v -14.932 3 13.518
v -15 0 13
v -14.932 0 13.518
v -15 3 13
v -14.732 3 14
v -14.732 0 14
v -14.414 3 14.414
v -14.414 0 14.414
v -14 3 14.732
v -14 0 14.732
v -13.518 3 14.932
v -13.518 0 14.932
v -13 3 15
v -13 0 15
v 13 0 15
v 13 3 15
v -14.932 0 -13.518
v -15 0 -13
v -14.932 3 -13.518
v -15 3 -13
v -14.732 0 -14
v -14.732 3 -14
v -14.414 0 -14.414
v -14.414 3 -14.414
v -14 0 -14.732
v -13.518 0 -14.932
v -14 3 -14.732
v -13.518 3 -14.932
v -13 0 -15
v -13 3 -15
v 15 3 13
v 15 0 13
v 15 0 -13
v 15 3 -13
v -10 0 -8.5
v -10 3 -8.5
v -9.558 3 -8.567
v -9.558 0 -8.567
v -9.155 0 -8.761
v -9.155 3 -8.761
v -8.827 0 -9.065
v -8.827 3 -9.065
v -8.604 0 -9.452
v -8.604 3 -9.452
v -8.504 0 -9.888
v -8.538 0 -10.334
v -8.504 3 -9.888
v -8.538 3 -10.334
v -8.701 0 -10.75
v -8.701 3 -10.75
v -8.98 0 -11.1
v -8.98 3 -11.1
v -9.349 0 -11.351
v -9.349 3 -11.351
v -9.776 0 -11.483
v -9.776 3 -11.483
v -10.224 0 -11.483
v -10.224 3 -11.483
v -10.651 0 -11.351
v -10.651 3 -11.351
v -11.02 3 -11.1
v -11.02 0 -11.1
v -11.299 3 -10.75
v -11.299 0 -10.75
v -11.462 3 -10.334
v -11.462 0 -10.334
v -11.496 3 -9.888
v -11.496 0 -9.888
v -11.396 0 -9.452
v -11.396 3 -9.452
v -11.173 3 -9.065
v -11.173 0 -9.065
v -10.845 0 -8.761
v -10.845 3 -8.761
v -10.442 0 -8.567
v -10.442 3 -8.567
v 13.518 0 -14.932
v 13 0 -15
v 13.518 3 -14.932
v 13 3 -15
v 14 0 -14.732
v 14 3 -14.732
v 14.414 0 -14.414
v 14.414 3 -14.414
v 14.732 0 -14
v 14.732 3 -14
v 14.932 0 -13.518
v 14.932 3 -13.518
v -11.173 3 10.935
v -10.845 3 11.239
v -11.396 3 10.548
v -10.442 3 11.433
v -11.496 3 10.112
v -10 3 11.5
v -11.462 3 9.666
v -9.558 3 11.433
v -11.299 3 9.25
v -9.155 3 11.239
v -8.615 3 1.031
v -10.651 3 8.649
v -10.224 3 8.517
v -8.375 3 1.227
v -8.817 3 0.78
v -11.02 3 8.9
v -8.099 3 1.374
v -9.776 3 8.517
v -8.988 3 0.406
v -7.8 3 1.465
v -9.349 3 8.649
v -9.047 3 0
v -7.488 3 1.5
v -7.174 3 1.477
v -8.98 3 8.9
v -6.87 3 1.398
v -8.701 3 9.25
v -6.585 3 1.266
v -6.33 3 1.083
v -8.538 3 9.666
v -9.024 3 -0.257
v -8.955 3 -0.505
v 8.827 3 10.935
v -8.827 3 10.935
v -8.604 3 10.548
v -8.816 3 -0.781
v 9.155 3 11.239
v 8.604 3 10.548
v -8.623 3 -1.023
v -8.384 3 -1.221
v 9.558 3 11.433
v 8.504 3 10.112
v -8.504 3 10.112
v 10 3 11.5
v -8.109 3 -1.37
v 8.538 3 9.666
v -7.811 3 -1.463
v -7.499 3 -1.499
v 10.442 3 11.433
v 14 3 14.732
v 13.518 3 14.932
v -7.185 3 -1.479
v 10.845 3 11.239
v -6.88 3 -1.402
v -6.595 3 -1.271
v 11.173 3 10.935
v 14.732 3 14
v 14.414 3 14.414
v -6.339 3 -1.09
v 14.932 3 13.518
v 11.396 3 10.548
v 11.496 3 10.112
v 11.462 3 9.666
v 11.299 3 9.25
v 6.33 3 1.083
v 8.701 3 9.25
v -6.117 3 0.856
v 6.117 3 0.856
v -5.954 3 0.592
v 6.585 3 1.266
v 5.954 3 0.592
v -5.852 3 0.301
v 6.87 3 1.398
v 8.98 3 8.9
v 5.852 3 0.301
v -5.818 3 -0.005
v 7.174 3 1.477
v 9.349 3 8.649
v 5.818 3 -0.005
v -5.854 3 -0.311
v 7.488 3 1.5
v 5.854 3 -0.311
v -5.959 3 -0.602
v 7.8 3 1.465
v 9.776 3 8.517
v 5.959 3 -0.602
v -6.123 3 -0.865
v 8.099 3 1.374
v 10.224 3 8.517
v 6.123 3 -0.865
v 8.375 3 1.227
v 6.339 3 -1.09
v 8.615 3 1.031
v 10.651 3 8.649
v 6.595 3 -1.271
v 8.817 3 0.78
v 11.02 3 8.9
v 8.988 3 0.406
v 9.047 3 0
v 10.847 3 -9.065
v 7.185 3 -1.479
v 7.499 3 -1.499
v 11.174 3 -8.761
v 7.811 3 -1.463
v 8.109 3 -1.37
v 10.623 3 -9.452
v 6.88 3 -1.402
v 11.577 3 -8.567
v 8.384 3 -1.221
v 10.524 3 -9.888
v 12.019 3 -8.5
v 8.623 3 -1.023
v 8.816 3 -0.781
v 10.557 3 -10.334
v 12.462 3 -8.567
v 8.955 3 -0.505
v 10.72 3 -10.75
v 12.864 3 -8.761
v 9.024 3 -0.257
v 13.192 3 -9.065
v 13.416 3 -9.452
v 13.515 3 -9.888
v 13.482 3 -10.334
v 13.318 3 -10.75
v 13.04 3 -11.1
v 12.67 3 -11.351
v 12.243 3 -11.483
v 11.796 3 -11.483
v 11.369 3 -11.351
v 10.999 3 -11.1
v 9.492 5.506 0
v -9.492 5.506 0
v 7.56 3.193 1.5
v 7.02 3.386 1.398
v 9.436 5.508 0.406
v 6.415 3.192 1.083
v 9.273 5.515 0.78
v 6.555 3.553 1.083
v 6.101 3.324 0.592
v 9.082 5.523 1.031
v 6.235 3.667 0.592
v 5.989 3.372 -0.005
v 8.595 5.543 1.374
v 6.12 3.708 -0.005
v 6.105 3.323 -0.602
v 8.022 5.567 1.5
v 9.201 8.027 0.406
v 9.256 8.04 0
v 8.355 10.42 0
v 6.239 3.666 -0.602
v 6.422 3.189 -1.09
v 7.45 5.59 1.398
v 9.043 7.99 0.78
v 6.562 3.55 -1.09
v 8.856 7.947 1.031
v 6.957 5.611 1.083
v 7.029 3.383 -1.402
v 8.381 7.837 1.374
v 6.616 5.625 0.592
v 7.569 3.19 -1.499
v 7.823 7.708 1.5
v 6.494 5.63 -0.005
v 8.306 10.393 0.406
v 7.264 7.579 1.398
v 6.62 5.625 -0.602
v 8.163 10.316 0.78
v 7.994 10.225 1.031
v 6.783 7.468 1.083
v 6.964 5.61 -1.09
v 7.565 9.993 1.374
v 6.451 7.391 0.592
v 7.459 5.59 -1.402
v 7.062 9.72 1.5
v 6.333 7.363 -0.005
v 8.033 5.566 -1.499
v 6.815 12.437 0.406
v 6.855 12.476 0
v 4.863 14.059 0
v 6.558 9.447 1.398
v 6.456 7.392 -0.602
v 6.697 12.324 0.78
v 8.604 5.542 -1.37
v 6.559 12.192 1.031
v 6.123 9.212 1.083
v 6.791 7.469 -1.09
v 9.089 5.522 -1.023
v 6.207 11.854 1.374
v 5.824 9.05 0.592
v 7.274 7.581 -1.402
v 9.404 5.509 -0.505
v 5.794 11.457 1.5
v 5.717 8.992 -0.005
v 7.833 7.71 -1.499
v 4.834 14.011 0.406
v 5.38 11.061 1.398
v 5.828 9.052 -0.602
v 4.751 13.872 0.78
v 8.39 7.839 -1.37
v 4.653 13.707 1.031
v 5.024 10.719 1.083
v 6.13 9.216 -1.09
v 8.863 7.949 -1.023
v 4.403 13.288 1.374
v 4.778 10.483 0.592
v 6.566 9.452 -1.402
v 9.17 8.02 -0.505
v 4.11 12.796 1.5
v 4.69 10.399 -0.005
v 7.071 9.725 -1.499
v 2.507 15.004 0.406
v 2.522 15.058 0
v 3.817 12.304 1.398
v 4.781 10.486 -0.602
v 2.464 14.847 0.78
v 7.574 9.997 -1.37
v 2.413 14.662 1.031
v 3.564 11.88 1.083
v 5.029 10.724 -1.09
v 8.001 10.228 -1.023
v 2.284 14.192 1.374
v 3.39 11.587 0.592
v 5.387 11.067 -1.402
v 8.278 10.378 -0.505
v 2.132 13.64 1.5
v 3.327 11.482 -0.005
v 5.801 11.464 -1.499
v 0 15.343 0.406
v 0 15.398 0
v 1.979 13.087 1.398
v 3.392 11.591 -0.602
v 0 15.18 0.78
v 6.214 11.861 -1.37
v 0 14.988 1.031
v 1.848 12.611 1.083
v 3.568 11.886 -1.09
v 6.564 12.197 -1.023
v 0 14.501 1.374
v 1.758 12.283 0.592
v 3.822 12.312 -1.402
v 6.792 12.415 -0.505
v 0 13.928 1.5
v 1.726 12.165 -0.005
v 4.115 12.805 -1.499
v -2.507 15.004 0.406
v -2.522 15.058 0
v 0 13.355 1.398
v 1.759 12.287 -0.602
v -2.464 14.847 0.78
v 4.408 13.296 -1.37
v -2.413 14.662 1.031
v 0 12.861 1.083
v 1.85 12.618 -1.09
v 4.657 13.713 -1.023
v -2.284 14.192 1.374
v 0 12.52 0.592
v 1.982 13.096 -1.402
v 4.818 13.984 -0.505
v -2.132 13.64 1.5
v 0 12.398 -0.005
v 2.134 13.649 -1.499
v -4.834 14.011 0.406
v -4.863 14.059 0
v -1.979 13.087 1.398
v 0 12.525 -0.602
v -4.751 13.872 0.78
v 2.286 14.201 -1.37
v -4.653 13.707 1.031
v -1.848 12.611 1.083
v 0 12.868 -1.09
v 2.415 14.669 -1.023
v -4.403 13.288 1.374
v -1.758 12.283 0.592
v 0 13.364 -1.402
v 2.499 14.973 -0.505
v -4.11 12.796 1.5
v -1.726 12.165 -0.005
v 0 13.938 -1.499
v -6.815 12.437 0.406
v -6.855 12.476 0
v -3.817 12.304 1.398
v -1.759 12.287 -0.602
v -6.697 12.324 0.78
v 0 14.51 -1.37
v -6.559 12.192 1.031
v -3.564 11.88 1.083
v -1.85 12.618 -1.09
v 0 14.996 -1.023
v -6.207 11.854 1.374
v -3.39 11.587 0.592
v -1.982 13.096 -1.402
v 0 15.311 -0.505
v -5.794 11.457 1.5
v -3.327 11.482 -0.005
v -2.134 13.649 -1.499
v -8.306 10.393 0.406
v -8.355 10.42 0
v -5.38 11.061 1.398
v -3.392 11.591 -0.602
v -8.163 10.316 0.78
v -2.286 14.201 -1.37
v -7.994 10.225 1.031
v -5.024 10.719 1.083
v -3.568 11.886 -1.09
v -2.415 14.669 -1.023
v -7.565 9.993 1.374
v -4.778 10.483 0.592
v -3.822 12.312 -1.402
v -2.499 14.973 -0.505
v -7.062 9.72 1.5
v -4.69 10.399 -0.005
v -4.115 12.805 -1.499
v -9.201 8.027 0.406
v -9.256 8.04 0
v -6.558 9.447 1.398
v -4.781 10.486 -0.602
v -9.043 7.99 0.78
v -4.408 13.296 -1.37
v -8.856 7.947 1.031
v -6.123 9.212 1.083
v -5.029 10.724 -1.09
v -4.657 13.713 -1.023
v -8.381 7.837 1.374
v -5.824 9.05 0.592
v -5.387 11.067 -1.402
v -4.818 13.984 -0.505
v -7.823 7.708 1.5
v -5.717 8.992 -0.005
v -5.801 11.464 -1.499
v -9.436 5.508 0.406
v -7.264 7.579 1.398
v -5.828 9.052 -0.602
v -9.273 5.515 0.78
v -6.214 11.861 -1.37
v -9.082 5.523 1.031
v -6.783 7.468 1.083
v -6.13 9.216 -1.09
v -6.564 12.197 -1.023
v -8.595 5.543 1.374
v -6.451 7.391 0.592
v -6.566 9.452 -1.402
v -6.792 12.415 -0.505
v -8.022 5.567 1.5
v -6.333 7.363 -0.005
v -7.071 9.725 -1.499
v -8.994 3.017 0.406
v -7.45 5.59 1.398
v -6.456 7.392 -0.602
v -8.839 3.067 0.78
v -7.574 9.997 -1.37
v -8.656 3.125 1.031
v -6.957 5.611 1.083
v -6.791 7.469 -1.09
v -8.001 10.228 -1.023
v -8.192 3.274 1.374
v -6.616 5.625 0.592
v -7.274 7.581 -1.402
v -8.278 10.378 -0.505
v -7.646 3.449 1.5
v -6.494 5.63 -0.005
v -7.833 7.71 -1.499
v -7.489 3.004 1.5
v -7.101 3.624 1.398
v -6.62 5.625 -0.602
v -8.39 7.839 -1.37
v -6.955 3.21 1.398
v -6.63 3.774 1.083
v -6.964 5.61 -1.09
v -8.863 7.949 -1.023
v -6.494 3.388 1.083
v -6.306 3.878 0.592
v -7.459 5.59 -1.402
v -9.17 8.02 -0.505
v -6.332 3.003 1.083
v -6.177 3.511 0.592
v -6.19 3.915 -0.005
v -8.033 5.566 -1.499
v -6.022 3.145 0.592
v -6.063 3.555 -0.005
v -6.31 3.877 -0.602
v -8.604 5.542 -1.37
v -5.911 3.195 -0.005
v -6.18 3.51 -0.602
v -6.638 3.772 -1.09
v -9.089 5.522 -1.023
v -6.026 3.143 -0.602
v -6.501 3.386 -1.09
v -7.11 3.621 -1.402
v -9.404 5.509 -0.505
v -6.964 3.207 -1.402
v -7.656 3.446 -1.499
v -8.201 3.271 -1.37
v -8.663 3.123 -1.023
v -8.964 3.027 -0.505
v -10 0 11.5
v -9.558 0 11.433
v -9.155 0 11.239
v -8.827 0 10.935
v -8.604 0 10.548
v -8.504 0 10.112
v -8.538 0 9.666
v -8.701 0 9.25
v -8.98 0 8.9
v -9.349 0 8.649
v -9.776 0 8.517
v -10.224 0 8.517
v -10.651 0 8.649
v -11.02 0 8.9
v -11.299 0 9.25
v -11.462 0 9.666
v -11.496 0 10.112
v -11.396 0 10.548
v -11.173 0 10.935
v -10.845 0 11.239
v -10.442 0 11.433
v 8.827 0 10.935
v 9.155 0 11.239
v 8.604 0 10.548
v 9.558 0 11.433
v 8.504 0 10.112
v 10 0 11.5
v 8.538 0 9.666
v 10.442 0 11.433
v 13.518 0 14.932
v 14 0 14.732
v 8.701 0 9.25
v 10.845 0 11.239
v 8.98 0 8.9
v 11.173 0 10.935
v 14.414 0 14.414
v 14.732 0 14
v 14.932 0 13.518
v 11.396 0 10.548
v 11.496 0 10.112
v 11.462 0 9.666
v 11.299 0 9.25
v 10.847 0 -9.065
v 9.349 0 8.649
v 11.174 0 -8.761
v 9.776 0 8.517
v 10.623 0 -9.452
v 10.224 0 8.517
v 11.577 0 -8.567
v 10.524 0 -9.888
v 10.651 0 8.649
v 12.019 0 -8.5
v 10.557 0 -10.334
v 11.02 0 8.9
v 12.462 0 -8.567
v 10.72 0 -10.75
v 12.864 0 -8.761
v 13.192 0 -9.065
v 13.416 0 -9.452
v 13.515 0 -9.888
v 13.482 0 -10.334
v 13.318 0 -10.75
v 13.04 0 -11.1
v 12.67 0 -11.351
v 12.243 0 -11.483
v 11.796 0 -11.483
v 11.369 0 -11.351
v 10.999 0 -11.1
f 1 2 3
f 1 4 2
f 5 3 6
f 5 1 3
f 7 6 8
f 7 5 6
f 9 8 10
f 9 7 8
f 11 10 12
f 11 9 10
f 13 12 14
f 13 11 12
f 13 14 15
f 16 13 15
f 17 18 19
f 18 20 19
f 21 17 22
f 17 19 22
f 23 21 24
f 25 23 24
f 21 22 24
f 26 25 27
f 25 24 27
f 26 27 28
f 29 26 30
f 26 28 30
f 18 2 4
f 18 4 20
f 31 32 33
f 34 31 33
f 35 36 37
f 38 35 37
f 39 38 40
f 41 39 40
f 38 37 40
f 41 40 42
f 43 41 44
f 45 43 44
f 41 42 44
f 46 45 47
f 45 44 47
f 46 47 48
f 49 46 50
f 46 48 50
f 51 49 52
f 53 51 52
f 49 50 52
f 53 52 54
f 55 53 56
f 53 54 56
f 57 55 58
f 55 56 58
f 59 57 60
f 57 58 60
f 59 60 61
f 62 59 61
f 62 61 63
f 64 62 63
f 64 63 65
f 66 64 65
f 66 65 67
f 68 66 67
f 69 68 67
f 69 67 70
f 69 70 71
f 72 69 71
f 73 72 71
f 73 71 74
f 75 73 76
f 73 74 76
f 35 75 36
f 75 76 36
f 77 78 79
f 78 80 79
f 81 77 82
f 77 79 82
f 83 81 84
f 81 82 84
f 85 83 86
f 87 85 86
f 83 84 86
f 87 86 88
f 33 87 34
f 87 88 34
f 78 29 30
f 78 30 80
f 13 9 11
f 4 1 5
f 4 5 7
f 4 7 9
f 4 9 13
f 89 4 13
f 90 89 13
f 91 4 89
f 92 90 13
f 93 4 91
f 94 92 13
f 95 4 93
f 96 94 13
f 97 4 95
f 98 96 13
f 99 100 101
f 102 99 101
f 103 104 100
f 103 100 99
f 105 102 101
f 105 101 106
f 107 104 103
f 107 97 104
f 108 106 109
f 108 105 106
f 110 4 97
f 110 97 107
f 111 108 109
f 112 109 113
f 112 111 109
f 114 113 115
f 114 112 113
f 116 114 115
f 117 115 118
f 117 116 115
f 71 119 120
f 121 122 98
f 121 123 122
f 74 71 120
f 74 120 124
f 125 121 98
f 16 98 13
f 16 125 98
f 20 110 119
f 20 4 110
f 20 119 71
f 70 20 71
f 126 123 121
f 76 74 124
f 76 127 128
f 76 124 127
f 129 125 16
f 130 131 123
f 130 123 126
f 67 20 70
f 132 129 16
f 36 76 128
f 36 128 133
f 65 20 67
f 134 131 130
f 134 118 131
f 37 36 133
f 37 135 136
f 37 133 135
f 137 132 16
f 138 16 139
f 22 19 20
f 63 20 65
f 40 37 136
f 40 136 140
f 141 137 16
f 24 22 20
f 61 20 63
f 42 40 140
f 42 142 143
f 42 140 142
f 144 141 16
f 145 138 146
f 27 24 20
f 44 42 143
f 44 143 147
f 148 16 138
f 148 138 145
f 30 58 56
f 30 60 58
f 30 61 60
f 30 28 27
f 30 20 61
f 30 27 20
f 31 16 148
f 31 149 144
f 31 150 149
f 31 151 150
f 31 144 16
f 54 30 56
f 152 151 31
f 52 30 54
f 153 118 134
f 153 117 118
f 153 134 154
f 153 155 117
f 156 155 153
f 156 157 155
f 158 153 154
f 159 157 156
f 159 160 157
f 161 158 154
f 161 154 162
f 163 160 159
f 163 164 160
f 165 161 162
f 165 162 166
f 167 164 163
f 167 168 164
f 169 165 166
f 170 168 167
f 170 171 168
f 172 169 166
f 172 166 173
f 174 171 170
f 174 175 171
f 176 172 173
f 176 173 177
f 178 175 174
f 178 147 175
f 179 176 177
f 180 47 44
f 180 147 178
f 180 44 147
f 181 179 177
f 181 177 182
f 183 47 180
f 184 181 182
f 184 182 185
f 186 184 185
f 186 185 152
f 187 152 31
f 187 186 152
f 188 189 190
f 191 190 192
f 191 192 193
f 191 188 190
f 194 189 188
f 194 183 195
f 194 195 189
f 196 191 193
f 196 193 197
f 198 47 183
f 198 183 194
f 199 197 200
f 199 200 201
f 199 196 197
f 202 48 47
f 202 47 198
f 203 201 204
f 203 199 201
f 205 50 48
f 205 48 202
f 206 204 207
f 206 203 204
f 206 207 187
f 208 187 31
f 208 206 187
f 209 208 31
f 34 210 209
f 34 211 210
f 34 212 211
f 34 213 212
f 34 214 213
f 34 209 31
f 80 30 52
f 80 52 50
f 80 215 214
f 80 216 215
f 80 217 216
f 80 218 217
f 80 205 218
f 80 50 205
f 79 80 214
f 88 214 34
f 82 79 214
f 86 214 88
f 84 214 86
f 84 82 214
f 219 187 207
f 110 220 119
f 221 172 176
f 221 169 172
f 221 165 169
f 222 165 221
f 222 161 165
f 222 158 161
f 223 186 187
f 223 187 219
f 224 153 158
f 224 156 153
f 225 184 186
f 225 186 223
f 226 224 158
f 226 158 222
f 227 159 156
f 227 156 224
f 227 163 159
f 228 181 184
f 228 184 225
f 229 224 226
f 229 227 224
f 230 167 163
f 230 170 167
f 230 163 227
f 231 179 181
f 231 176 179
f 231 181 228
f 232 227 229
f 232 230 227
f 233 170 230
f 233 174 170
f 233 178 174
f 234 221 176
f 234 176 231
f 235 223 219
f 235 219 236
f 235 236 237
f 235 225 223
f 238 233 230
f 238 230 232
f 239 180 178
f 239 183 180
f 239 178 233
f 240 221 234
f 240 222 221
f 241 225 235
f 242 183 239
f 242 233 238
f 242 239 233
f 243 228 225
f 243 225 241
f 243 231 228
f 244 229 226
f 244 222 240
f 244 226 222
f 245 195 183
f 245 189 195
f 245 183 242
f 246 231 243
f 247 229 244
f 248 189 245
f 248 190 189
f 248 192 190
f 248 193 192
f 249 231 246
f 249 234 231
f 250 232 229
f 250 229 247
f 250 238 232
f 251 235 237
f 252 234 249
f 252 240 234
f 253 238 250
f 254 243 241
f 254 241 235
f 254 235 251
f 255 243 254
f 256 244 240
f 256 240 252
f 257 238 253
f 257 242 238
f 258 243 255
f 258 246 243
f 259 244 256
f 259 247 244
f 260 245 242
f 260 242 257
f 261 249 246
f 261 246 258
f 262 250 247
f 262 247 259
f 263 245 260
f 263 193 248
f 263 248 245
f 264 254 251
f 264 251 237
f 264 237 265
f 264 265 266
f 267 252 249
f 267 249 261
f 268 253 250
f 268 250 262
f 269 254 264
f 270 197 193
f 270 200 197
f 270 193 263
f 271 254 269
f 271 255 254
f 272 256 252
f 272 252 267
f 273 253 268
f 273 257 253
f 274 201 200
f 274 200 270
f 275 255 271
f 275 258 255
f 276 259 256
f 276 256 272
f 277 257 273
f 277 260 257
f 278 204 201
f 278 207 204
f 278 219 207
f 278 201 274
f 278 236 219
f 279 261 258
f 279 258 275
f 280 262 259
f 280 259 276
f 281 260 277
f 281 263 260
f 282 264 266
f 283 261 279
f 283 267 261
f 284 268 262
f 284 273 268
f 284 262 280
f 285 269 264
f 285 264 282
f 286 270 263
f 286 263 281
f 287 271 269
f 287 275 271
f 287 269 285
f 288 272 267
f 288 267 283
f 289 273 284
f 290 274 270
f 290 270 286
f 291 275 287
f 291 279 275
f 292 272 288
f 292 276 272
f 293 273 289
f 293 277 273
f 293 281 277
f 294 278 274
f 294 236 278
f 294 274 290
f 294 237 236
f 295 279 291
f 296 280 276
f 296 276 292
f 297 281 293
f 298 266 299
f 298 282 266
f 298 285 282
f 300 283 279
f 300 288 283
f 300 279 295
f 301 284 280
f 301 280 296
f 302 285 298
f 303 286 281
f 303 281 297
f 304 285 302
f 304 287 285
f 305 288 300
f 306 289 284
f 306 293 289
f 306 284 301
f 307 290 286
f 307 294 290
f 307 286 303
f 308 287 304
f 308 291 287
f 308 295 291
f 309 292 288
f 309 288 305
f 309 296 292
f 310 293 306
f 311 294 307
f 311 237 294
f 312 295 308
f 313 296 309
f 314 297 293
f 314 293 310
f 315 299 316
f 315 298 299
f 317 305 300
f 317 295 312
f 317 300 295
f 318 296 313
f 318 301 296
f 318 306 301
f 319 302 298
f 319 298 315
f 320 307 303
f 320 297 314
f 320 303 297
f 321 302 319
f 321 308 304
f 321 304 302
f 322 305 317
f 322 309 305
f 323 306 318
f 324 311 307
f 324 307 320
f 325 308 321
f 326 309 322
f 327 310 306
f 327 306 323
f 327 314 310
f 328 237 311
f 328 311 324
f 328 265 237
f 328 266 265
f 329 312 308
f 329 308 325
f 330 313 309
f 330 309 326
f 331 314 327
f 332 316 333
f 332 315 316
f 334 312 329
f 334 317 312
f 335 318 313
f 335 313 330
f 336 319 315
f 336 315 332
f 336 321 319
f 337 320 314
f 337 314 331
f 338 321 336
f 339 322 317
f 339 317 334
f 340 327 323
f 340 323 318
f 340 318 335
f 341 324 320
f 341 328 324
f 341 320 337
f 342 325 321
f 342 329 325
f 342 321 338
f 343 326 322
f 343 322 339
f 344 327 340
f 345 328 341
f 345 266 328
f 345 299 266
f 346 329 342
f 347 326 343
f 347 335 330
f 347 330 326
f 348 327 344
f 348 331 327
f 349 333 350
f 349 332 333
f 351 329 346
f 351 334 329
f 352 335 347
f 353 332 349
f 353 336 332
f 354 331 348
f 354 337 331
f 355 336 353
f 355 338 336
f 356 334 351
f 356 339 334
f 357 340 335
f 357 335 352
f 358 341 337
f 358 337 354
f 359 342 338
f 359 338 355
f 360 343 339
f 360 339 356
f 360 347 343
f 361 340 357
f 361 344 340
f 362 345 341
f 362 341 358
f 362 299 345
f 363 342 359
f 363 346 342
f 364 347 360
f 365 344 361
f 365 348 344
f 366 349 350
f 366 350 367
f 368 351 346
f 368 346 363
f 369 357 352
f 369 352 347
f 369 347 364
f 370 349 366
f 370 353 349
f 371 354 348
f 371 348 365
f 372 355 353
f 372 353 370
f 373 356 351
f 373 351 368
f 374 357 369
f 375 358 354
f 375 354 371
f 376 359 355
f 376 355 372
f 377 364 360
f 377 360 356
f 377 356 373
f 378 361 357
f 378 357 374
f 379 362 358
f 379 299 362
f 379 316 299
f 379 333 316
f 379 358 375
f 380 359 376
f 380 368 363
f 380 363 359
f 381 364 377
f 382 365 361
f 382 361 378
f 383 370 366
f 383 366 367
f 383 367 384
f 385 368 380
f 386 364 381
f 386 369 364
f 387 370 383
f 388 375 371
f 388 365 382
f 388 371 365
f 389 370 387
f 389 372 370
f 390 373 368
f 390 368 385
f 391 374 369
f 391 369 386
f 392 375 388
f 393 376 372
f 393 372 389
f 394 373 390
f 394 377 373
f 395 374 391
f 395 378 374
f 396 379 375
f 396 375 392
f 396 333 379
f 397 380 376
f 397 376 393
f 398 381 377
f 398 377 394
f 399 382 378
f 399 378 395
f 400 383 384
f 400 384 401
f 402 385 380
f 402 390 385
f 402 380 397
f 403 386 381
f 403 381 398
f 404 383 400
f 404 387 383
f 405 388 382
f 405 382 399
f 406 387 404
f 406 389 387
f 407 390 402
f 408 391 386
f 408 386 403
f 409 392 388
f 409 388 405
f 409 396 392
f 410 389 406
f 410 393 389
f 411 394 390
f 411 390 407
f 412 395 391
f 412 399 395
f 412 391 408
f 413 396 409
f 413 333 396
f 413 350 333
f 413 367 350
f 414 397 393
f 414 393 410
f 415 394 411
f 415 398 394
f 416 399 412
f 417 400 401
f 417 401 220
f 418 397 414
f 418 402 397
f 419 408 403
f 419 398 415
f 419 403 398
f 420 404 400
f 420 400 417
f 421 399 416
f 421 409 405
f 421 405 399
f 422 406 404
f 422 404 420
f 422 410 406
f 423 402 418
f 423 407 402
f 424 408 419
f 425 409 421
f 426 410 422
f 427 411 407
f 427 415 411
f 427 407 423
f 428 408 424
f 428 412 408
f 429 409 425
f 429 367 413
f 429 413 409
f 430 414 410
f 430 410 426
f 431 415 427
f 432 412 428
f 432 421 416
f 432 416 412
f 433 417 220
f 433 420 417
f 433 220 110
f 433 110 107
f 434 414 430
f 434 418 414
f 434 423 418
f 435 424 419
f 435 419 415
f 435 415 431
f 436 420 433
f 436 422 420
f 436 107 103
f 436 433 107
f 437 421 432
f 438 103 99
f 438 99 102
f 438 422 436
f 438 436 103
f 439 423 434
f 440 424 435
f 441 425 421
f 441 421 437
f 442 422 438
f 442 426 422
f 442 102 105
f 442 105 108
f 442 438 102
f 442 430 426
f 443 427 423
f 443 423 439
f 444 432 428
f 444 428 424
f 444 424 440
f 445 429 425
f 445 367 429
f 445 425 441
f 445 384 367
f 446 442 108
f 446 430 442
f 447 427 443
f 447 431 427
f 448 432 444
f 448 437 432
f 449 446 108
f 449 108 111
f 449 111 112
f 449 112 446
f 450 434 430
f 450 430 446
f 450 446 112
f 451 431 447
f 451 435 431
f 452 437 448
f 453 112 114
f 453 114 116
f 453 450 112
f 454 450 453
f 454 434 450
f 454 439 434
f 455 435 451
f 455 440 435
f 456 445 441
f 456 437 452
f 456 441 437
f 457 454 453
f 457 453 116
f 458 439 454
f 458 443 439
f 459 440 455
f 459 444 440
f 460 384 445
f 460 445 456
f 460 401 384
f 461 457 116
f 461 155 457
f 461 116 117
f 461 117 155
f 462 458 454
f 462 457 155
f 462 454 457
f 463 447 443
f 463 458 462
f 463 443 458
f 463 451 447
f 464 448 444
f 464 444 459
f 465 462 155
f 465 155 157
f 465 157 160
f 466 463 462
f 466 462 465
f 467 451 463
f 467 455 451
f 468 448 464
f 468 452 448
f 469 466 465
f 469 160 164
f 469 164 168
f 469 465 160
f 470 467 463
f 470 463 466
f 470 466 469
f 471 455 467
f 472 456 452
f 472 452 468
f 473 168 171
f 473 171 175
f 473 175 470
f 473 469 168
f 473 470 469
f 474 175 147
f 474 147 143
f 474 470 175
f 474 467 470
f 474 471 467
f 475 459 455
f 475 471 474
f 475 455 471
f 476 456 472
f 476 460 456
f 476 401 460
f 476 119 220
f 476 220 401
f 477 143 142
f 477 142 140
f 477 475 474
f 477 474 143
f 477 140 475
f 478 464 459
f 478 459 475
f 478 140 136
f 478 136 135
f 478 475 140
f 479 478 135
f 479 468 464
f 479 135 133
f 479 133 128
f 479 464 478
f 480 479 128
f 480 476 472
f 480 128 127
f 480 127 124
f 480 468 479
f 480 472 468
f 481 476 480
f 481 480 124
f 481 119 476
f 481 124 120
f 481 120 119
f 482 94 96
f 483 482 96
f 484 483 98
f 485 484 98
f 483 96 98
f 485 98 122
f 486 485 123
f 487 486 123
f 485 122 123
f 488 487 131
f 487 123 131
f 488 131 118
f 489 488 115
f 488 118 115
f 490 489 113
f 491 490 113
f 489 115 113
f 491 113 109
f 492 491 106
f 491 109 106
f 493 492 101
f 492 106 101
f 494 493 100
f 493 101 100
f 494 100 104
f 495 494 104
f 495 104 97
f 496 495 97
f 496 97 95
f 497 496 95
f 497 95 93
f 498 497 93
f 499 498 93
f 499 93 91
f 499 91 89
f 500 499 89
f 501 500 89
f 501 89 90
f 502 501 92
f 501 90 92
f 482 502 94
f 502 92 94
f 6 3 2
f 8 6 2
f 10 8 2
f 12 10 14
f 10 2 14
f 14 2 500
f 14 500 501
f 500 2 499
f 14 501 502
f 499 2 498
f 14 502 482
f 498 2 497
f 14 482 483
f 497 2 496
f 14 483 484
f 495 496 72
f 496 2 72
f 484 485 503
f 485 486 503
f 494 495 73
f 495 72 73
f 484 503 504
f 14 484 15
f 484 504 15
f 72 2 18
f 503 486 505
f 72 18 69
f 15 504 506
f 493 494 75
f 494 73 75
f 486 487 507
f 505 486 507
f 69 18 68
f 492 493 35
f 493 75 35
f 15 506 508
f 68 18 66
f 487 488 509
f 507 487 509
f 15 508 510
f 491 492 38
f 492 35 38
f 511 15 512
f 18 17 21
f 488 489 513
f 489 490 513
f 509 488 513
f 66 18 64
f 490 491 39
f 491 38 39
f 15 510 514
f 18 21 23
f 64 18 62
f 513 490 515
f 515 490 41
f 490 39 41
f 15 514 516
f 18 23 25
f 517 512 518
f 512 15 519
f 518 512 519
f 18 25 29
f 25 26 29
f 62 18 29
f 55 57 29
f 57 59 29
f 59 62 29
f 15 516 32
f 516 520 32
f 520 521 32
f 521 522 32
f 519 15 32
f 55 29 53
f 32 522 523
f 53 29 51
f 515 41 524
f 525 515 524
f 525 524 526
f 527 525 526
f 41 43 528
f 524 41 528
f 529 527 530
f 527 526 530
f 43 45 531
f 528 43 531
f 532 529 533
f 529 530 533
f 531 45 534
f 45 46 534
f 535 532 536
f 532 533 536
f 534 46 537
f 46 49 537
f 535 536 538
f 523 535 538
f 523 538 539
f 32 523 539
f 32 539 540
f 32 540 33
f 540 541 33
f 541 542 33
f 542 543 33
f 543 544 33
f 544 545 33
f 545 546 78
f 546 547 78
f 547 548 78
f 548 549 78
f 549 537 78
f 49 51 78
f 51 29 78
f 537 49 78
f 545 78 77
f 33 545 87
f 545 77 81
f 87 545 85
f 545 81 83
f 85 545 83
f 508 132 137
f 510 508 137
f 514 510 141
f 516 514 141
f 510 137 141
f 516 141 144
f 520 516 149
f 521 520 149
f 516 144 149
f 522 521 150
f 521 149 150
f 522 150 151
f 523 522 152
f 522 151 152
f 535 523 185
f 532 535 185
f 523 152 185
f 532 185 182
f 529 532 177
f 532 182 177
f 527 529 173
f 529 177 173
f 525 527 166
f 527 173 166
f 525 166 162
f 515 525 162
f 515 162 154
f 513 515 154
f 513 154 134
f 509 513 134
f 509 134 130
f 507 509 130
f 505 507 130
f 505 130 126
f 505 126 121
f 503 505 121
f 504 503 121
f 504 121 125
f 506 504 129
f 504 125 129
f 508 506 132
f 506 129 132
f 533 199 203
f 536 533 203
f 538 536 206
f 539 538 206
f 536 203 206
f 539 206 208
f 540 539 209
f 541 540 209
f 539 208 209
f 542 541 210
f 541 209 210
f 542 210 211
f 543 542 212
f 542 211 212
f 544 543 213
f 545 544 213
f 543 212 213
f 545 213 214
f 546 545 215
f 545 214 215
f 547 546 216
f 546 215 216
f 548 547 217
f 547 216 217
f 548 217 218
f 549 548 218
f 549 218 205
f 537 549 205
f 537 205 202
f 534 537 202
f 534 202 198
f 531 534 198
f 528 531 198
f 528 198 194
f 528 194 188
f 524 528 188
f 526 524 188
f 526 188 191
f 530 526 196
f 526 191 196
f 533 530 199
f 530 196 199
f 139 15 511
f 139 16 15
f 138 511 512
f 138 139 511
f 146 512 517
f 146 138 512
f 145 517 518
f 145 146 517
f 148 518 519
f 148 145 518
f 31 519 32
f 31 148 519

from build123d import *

# Parameters (mm, degrees)
SKETCH1_W           = 30
SKETCH1_H           = 30
BOSS_EXTRUDE1_DEPTH = 3
SWEEP1_PROFILE_R    = 1.5
SKETCH12_R          = 1.5
CUT_EXTRUDE1_DEPTH  = 3
FILLET1_R           = 2


with BuildPart() as part:
    # Sketch1 → Boss-Extrude1 (new body)
    with BuildSketch(Plane(origin=(0, 0, 0), x_dir=(1, 0, 0), z_dir=(0, 1, 0))):
        Rectangle(SKETCH1_W, SKETCH1_H)
    extrude(amount=BOSS_EXTRUDE1_DEPTH)

    # Sweep1: sweep along a path in Sketch2
    with BuildLine(Plane.XY) as sweep1_path:
        ThreePointArc((6.607920582, 1.389009429), (0, 13.898486736), (-6.607920582, 1.389009429))
    # Sweep1 profile (on start of the path) → Sweep1 (sweep)
    with BuildSketch(Plane(origin=(6.607920582, 1.389009429, 0), x_dir=(0.8259900728012373, -0.5636846632948309, 0), z_dir=(0.5636846632948309, 0.8259900728012373, 0))):
        Circle(SWEEP1_PROFILE_R)
    sweep(path=sweep1_path.line)

    # Sketch12 → Cut-Extrude1 (cut)
    with BuildSketch(Plane(origin=(0, 3, 0), x_dir=(1, 0, 0), z_dir=(0, 1, 0))):
        with Locations((-10, 10)):
            Circle(SKETCH12_R)
        with Locations((12.019460679, 10)):
            Circle(SKETCH12_R)
        with Locations((10, -10)):
            Circle(SKETCH12_R)
        with Locations((-10, -10)):
            Circle(SKETCH12_R)
    extrude(amount=-CUT_EXTRUDE1_DEPTH, mode=Mode.SUBTRACT)

    # Fillet1
    fillet1_edges = [part.edges().sort_by_distance(p)[0] for p in [
        (-15, 1.5, 15),
        (-15, 1.5, -15),
        (15, 1.5, 15),
        (15, 1.5, -15),
    ]]
    fillet(fillet1_edges, radius=FILLET1_R)


solid = part.part
